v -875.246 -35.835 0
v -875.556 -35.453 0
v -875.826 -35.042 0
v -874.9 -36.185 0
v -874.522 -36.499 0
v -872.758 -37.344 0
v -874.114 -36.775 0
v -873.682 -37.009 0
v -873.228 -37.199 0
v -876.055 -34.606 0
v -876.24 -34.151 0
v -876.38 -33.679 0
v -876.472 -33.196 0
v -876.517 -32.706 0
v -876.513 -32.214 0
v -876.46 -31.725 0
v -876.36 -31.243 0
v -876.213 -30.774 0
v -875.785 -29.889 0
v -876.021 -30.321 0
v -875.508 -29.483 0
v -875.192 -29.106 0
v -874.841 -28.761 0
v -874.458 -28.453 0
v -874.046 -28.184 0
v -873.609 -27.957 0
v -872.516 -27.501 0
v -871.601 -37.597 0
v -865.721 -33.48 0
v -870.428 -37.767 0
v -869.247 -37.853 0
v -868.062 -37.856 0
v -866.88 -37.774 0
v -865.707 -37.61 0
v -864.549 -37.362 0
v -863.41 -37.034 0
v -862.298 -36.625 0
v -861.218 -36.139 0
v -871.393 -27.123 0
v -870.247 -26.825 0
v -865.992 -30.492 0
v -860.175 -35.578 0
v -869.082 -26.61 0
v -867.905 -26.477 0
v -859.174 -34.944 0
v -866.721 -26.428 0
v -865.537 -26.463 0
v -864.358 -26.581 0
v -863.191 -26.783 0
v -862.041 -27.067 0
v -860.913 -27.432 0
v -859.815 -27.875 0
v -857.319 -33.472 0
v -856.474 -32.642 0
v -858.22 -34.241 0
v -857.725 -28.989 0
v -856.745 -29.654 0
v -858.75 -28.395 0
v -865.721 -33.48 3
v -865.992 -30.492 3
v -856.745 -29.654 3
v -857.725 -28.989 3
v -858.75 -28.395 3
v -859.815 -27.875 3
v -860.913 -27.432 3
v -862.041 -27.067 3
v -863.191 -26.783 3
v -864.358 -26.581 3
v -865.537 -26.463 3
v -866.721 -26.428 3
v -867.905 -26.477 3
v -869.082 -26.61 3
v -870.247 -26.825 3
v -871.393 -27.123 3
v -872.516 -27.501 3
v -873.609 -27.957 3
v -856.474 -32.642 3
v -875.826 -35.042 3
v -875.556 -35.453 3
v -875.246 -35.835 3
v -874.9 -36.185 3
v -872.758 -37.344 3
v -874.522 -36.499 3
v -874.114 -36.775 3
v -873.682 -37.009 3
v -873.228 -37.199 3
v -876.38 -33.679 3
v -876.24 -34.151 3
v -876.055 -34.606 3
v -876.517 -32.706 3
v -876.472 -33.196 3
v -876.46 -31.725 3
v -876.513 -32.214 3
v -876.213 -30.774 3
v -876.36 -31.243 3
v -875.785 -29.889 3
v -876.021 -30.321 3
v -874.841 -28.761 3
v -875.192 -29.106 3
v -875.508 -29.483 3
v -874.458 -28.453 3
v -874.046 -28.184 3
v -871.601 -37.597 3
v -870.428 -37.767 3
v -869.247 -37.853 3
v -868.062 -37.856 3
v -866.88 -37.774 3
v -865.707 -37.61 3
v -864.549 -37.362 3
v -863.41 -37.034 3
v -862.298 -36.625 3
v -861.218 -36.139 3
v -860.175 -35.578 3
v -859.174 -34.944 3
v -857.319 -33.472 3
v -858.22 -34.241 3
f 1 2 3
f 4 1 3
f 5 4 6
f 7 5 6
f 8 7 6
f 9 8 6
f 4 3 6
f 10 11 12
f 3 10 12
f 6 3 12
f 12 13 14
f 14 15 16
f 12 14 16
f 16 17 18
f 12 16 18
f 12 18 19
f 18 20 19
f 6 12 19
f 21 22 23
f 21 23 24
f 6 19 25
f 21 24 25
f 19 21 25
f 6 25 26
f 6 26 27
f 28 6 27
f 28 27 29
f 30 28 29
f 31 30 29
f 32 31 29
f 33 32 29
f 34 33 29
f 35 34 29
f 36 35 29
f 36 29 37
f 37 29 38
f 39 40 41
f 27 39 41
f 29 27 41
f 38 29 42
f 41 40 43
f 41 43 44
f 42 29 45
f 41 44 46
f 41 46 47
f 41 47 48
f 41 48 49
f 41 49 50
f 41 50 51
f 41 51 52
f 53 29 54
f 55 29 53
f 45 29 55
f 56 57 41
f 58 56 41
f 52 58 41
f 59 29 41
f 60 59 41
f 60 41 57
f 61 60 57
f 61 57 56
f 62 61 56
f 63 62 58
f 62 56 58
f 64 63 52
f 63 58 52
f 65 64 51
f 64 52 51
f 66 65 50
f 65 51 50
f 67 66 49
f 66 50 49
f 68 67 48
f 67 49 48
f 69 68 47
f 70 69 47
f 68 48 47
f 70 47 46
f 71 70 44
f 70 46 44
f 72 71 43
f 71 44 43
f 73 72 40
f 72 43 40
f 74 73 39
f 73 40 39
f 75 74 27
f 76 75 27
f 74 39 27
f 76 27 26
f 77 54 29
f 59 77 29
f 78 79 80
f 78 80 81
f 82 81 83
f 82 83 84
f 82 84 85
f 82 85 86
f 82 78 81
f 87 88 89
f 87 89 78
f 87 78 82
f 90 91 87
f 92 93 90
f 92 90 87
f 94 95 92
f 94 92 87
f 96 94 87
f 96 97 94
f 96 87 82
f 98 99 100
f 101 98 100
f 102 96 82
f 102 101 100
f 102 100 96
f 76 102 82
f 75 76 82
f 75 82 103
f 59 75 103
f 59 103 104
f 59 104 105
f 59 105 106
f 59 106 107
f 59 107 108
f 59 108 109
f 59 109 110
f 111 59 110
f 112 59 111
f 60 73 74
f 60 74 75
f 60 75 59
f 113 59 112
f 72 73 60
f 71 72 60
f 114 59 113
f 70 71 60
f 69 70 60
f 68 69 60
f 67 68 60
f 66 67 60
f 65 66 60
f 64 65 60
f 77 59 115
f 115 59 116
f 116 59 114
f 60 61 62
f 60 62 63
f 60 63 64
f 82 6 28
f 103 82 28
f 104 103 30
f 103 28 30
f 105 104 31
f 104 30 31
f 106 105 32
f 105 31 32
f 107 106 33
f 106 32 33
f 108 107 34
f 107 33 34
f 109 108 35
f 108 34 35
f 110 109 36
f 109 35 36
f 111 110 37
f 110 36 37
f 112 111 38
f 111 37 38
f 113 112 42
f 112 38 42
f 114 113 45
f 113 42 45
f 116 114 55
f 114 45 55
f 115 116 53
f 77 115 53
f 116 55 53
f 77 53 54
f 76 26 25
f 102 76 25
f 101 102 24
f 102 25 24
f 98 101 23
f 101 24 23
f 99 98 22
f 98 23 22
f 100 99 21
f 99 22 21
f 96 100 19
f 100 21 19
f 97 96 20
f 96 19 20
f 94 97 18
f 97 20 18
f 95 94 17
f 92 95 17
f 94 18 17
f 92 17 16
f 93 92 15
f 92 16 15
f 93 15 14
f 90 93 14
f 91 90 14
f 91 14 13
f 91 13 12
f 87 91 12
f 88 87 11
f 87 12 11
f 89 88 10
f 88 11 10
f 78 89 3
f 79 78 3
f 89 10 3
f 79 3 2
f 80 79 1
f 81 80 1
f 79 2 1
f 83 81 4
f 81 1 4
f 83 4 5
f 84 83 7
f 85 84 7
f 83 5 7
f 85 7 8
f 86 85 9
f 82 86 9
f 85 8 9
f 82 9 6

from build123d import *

# Parameters (mm, degrees)
BASE_EXTRUDE_DEPTH = 3


with BuildPart() as part:
    # Sketch1 → Base-Extrude (new body)
    with BuildSketch(Plane.XY):
        with BuildLine():
            Line((-856.474214644, -32.641915538), (-865.720770196, -33.480229749))
            Line((-865.720770196, -33.480229749), (-865.991646191, -30.492483743))
            Line((-865.991646191, -30.492483743), (-856.745090639, -29.654169532))
            ThreePointArc((-856.745090639, -29.654169532), (-864.946405641, -26.511655783), (-873.609416526, -27.957063286))
            ThreePointArc((-873.609416526, -27.957063286), (-876.500341632, -32.951378616), (-872.758344407, -37.344337795))
            ThreePointArc((-872.758344407, -37.344337795), (-863.976635131, -37.208166435), (-856.474214644, -32.641915538))
        make_face()
    extrude(amount=BASE_EXTRUDE_DEPTH)


solid = part.part
